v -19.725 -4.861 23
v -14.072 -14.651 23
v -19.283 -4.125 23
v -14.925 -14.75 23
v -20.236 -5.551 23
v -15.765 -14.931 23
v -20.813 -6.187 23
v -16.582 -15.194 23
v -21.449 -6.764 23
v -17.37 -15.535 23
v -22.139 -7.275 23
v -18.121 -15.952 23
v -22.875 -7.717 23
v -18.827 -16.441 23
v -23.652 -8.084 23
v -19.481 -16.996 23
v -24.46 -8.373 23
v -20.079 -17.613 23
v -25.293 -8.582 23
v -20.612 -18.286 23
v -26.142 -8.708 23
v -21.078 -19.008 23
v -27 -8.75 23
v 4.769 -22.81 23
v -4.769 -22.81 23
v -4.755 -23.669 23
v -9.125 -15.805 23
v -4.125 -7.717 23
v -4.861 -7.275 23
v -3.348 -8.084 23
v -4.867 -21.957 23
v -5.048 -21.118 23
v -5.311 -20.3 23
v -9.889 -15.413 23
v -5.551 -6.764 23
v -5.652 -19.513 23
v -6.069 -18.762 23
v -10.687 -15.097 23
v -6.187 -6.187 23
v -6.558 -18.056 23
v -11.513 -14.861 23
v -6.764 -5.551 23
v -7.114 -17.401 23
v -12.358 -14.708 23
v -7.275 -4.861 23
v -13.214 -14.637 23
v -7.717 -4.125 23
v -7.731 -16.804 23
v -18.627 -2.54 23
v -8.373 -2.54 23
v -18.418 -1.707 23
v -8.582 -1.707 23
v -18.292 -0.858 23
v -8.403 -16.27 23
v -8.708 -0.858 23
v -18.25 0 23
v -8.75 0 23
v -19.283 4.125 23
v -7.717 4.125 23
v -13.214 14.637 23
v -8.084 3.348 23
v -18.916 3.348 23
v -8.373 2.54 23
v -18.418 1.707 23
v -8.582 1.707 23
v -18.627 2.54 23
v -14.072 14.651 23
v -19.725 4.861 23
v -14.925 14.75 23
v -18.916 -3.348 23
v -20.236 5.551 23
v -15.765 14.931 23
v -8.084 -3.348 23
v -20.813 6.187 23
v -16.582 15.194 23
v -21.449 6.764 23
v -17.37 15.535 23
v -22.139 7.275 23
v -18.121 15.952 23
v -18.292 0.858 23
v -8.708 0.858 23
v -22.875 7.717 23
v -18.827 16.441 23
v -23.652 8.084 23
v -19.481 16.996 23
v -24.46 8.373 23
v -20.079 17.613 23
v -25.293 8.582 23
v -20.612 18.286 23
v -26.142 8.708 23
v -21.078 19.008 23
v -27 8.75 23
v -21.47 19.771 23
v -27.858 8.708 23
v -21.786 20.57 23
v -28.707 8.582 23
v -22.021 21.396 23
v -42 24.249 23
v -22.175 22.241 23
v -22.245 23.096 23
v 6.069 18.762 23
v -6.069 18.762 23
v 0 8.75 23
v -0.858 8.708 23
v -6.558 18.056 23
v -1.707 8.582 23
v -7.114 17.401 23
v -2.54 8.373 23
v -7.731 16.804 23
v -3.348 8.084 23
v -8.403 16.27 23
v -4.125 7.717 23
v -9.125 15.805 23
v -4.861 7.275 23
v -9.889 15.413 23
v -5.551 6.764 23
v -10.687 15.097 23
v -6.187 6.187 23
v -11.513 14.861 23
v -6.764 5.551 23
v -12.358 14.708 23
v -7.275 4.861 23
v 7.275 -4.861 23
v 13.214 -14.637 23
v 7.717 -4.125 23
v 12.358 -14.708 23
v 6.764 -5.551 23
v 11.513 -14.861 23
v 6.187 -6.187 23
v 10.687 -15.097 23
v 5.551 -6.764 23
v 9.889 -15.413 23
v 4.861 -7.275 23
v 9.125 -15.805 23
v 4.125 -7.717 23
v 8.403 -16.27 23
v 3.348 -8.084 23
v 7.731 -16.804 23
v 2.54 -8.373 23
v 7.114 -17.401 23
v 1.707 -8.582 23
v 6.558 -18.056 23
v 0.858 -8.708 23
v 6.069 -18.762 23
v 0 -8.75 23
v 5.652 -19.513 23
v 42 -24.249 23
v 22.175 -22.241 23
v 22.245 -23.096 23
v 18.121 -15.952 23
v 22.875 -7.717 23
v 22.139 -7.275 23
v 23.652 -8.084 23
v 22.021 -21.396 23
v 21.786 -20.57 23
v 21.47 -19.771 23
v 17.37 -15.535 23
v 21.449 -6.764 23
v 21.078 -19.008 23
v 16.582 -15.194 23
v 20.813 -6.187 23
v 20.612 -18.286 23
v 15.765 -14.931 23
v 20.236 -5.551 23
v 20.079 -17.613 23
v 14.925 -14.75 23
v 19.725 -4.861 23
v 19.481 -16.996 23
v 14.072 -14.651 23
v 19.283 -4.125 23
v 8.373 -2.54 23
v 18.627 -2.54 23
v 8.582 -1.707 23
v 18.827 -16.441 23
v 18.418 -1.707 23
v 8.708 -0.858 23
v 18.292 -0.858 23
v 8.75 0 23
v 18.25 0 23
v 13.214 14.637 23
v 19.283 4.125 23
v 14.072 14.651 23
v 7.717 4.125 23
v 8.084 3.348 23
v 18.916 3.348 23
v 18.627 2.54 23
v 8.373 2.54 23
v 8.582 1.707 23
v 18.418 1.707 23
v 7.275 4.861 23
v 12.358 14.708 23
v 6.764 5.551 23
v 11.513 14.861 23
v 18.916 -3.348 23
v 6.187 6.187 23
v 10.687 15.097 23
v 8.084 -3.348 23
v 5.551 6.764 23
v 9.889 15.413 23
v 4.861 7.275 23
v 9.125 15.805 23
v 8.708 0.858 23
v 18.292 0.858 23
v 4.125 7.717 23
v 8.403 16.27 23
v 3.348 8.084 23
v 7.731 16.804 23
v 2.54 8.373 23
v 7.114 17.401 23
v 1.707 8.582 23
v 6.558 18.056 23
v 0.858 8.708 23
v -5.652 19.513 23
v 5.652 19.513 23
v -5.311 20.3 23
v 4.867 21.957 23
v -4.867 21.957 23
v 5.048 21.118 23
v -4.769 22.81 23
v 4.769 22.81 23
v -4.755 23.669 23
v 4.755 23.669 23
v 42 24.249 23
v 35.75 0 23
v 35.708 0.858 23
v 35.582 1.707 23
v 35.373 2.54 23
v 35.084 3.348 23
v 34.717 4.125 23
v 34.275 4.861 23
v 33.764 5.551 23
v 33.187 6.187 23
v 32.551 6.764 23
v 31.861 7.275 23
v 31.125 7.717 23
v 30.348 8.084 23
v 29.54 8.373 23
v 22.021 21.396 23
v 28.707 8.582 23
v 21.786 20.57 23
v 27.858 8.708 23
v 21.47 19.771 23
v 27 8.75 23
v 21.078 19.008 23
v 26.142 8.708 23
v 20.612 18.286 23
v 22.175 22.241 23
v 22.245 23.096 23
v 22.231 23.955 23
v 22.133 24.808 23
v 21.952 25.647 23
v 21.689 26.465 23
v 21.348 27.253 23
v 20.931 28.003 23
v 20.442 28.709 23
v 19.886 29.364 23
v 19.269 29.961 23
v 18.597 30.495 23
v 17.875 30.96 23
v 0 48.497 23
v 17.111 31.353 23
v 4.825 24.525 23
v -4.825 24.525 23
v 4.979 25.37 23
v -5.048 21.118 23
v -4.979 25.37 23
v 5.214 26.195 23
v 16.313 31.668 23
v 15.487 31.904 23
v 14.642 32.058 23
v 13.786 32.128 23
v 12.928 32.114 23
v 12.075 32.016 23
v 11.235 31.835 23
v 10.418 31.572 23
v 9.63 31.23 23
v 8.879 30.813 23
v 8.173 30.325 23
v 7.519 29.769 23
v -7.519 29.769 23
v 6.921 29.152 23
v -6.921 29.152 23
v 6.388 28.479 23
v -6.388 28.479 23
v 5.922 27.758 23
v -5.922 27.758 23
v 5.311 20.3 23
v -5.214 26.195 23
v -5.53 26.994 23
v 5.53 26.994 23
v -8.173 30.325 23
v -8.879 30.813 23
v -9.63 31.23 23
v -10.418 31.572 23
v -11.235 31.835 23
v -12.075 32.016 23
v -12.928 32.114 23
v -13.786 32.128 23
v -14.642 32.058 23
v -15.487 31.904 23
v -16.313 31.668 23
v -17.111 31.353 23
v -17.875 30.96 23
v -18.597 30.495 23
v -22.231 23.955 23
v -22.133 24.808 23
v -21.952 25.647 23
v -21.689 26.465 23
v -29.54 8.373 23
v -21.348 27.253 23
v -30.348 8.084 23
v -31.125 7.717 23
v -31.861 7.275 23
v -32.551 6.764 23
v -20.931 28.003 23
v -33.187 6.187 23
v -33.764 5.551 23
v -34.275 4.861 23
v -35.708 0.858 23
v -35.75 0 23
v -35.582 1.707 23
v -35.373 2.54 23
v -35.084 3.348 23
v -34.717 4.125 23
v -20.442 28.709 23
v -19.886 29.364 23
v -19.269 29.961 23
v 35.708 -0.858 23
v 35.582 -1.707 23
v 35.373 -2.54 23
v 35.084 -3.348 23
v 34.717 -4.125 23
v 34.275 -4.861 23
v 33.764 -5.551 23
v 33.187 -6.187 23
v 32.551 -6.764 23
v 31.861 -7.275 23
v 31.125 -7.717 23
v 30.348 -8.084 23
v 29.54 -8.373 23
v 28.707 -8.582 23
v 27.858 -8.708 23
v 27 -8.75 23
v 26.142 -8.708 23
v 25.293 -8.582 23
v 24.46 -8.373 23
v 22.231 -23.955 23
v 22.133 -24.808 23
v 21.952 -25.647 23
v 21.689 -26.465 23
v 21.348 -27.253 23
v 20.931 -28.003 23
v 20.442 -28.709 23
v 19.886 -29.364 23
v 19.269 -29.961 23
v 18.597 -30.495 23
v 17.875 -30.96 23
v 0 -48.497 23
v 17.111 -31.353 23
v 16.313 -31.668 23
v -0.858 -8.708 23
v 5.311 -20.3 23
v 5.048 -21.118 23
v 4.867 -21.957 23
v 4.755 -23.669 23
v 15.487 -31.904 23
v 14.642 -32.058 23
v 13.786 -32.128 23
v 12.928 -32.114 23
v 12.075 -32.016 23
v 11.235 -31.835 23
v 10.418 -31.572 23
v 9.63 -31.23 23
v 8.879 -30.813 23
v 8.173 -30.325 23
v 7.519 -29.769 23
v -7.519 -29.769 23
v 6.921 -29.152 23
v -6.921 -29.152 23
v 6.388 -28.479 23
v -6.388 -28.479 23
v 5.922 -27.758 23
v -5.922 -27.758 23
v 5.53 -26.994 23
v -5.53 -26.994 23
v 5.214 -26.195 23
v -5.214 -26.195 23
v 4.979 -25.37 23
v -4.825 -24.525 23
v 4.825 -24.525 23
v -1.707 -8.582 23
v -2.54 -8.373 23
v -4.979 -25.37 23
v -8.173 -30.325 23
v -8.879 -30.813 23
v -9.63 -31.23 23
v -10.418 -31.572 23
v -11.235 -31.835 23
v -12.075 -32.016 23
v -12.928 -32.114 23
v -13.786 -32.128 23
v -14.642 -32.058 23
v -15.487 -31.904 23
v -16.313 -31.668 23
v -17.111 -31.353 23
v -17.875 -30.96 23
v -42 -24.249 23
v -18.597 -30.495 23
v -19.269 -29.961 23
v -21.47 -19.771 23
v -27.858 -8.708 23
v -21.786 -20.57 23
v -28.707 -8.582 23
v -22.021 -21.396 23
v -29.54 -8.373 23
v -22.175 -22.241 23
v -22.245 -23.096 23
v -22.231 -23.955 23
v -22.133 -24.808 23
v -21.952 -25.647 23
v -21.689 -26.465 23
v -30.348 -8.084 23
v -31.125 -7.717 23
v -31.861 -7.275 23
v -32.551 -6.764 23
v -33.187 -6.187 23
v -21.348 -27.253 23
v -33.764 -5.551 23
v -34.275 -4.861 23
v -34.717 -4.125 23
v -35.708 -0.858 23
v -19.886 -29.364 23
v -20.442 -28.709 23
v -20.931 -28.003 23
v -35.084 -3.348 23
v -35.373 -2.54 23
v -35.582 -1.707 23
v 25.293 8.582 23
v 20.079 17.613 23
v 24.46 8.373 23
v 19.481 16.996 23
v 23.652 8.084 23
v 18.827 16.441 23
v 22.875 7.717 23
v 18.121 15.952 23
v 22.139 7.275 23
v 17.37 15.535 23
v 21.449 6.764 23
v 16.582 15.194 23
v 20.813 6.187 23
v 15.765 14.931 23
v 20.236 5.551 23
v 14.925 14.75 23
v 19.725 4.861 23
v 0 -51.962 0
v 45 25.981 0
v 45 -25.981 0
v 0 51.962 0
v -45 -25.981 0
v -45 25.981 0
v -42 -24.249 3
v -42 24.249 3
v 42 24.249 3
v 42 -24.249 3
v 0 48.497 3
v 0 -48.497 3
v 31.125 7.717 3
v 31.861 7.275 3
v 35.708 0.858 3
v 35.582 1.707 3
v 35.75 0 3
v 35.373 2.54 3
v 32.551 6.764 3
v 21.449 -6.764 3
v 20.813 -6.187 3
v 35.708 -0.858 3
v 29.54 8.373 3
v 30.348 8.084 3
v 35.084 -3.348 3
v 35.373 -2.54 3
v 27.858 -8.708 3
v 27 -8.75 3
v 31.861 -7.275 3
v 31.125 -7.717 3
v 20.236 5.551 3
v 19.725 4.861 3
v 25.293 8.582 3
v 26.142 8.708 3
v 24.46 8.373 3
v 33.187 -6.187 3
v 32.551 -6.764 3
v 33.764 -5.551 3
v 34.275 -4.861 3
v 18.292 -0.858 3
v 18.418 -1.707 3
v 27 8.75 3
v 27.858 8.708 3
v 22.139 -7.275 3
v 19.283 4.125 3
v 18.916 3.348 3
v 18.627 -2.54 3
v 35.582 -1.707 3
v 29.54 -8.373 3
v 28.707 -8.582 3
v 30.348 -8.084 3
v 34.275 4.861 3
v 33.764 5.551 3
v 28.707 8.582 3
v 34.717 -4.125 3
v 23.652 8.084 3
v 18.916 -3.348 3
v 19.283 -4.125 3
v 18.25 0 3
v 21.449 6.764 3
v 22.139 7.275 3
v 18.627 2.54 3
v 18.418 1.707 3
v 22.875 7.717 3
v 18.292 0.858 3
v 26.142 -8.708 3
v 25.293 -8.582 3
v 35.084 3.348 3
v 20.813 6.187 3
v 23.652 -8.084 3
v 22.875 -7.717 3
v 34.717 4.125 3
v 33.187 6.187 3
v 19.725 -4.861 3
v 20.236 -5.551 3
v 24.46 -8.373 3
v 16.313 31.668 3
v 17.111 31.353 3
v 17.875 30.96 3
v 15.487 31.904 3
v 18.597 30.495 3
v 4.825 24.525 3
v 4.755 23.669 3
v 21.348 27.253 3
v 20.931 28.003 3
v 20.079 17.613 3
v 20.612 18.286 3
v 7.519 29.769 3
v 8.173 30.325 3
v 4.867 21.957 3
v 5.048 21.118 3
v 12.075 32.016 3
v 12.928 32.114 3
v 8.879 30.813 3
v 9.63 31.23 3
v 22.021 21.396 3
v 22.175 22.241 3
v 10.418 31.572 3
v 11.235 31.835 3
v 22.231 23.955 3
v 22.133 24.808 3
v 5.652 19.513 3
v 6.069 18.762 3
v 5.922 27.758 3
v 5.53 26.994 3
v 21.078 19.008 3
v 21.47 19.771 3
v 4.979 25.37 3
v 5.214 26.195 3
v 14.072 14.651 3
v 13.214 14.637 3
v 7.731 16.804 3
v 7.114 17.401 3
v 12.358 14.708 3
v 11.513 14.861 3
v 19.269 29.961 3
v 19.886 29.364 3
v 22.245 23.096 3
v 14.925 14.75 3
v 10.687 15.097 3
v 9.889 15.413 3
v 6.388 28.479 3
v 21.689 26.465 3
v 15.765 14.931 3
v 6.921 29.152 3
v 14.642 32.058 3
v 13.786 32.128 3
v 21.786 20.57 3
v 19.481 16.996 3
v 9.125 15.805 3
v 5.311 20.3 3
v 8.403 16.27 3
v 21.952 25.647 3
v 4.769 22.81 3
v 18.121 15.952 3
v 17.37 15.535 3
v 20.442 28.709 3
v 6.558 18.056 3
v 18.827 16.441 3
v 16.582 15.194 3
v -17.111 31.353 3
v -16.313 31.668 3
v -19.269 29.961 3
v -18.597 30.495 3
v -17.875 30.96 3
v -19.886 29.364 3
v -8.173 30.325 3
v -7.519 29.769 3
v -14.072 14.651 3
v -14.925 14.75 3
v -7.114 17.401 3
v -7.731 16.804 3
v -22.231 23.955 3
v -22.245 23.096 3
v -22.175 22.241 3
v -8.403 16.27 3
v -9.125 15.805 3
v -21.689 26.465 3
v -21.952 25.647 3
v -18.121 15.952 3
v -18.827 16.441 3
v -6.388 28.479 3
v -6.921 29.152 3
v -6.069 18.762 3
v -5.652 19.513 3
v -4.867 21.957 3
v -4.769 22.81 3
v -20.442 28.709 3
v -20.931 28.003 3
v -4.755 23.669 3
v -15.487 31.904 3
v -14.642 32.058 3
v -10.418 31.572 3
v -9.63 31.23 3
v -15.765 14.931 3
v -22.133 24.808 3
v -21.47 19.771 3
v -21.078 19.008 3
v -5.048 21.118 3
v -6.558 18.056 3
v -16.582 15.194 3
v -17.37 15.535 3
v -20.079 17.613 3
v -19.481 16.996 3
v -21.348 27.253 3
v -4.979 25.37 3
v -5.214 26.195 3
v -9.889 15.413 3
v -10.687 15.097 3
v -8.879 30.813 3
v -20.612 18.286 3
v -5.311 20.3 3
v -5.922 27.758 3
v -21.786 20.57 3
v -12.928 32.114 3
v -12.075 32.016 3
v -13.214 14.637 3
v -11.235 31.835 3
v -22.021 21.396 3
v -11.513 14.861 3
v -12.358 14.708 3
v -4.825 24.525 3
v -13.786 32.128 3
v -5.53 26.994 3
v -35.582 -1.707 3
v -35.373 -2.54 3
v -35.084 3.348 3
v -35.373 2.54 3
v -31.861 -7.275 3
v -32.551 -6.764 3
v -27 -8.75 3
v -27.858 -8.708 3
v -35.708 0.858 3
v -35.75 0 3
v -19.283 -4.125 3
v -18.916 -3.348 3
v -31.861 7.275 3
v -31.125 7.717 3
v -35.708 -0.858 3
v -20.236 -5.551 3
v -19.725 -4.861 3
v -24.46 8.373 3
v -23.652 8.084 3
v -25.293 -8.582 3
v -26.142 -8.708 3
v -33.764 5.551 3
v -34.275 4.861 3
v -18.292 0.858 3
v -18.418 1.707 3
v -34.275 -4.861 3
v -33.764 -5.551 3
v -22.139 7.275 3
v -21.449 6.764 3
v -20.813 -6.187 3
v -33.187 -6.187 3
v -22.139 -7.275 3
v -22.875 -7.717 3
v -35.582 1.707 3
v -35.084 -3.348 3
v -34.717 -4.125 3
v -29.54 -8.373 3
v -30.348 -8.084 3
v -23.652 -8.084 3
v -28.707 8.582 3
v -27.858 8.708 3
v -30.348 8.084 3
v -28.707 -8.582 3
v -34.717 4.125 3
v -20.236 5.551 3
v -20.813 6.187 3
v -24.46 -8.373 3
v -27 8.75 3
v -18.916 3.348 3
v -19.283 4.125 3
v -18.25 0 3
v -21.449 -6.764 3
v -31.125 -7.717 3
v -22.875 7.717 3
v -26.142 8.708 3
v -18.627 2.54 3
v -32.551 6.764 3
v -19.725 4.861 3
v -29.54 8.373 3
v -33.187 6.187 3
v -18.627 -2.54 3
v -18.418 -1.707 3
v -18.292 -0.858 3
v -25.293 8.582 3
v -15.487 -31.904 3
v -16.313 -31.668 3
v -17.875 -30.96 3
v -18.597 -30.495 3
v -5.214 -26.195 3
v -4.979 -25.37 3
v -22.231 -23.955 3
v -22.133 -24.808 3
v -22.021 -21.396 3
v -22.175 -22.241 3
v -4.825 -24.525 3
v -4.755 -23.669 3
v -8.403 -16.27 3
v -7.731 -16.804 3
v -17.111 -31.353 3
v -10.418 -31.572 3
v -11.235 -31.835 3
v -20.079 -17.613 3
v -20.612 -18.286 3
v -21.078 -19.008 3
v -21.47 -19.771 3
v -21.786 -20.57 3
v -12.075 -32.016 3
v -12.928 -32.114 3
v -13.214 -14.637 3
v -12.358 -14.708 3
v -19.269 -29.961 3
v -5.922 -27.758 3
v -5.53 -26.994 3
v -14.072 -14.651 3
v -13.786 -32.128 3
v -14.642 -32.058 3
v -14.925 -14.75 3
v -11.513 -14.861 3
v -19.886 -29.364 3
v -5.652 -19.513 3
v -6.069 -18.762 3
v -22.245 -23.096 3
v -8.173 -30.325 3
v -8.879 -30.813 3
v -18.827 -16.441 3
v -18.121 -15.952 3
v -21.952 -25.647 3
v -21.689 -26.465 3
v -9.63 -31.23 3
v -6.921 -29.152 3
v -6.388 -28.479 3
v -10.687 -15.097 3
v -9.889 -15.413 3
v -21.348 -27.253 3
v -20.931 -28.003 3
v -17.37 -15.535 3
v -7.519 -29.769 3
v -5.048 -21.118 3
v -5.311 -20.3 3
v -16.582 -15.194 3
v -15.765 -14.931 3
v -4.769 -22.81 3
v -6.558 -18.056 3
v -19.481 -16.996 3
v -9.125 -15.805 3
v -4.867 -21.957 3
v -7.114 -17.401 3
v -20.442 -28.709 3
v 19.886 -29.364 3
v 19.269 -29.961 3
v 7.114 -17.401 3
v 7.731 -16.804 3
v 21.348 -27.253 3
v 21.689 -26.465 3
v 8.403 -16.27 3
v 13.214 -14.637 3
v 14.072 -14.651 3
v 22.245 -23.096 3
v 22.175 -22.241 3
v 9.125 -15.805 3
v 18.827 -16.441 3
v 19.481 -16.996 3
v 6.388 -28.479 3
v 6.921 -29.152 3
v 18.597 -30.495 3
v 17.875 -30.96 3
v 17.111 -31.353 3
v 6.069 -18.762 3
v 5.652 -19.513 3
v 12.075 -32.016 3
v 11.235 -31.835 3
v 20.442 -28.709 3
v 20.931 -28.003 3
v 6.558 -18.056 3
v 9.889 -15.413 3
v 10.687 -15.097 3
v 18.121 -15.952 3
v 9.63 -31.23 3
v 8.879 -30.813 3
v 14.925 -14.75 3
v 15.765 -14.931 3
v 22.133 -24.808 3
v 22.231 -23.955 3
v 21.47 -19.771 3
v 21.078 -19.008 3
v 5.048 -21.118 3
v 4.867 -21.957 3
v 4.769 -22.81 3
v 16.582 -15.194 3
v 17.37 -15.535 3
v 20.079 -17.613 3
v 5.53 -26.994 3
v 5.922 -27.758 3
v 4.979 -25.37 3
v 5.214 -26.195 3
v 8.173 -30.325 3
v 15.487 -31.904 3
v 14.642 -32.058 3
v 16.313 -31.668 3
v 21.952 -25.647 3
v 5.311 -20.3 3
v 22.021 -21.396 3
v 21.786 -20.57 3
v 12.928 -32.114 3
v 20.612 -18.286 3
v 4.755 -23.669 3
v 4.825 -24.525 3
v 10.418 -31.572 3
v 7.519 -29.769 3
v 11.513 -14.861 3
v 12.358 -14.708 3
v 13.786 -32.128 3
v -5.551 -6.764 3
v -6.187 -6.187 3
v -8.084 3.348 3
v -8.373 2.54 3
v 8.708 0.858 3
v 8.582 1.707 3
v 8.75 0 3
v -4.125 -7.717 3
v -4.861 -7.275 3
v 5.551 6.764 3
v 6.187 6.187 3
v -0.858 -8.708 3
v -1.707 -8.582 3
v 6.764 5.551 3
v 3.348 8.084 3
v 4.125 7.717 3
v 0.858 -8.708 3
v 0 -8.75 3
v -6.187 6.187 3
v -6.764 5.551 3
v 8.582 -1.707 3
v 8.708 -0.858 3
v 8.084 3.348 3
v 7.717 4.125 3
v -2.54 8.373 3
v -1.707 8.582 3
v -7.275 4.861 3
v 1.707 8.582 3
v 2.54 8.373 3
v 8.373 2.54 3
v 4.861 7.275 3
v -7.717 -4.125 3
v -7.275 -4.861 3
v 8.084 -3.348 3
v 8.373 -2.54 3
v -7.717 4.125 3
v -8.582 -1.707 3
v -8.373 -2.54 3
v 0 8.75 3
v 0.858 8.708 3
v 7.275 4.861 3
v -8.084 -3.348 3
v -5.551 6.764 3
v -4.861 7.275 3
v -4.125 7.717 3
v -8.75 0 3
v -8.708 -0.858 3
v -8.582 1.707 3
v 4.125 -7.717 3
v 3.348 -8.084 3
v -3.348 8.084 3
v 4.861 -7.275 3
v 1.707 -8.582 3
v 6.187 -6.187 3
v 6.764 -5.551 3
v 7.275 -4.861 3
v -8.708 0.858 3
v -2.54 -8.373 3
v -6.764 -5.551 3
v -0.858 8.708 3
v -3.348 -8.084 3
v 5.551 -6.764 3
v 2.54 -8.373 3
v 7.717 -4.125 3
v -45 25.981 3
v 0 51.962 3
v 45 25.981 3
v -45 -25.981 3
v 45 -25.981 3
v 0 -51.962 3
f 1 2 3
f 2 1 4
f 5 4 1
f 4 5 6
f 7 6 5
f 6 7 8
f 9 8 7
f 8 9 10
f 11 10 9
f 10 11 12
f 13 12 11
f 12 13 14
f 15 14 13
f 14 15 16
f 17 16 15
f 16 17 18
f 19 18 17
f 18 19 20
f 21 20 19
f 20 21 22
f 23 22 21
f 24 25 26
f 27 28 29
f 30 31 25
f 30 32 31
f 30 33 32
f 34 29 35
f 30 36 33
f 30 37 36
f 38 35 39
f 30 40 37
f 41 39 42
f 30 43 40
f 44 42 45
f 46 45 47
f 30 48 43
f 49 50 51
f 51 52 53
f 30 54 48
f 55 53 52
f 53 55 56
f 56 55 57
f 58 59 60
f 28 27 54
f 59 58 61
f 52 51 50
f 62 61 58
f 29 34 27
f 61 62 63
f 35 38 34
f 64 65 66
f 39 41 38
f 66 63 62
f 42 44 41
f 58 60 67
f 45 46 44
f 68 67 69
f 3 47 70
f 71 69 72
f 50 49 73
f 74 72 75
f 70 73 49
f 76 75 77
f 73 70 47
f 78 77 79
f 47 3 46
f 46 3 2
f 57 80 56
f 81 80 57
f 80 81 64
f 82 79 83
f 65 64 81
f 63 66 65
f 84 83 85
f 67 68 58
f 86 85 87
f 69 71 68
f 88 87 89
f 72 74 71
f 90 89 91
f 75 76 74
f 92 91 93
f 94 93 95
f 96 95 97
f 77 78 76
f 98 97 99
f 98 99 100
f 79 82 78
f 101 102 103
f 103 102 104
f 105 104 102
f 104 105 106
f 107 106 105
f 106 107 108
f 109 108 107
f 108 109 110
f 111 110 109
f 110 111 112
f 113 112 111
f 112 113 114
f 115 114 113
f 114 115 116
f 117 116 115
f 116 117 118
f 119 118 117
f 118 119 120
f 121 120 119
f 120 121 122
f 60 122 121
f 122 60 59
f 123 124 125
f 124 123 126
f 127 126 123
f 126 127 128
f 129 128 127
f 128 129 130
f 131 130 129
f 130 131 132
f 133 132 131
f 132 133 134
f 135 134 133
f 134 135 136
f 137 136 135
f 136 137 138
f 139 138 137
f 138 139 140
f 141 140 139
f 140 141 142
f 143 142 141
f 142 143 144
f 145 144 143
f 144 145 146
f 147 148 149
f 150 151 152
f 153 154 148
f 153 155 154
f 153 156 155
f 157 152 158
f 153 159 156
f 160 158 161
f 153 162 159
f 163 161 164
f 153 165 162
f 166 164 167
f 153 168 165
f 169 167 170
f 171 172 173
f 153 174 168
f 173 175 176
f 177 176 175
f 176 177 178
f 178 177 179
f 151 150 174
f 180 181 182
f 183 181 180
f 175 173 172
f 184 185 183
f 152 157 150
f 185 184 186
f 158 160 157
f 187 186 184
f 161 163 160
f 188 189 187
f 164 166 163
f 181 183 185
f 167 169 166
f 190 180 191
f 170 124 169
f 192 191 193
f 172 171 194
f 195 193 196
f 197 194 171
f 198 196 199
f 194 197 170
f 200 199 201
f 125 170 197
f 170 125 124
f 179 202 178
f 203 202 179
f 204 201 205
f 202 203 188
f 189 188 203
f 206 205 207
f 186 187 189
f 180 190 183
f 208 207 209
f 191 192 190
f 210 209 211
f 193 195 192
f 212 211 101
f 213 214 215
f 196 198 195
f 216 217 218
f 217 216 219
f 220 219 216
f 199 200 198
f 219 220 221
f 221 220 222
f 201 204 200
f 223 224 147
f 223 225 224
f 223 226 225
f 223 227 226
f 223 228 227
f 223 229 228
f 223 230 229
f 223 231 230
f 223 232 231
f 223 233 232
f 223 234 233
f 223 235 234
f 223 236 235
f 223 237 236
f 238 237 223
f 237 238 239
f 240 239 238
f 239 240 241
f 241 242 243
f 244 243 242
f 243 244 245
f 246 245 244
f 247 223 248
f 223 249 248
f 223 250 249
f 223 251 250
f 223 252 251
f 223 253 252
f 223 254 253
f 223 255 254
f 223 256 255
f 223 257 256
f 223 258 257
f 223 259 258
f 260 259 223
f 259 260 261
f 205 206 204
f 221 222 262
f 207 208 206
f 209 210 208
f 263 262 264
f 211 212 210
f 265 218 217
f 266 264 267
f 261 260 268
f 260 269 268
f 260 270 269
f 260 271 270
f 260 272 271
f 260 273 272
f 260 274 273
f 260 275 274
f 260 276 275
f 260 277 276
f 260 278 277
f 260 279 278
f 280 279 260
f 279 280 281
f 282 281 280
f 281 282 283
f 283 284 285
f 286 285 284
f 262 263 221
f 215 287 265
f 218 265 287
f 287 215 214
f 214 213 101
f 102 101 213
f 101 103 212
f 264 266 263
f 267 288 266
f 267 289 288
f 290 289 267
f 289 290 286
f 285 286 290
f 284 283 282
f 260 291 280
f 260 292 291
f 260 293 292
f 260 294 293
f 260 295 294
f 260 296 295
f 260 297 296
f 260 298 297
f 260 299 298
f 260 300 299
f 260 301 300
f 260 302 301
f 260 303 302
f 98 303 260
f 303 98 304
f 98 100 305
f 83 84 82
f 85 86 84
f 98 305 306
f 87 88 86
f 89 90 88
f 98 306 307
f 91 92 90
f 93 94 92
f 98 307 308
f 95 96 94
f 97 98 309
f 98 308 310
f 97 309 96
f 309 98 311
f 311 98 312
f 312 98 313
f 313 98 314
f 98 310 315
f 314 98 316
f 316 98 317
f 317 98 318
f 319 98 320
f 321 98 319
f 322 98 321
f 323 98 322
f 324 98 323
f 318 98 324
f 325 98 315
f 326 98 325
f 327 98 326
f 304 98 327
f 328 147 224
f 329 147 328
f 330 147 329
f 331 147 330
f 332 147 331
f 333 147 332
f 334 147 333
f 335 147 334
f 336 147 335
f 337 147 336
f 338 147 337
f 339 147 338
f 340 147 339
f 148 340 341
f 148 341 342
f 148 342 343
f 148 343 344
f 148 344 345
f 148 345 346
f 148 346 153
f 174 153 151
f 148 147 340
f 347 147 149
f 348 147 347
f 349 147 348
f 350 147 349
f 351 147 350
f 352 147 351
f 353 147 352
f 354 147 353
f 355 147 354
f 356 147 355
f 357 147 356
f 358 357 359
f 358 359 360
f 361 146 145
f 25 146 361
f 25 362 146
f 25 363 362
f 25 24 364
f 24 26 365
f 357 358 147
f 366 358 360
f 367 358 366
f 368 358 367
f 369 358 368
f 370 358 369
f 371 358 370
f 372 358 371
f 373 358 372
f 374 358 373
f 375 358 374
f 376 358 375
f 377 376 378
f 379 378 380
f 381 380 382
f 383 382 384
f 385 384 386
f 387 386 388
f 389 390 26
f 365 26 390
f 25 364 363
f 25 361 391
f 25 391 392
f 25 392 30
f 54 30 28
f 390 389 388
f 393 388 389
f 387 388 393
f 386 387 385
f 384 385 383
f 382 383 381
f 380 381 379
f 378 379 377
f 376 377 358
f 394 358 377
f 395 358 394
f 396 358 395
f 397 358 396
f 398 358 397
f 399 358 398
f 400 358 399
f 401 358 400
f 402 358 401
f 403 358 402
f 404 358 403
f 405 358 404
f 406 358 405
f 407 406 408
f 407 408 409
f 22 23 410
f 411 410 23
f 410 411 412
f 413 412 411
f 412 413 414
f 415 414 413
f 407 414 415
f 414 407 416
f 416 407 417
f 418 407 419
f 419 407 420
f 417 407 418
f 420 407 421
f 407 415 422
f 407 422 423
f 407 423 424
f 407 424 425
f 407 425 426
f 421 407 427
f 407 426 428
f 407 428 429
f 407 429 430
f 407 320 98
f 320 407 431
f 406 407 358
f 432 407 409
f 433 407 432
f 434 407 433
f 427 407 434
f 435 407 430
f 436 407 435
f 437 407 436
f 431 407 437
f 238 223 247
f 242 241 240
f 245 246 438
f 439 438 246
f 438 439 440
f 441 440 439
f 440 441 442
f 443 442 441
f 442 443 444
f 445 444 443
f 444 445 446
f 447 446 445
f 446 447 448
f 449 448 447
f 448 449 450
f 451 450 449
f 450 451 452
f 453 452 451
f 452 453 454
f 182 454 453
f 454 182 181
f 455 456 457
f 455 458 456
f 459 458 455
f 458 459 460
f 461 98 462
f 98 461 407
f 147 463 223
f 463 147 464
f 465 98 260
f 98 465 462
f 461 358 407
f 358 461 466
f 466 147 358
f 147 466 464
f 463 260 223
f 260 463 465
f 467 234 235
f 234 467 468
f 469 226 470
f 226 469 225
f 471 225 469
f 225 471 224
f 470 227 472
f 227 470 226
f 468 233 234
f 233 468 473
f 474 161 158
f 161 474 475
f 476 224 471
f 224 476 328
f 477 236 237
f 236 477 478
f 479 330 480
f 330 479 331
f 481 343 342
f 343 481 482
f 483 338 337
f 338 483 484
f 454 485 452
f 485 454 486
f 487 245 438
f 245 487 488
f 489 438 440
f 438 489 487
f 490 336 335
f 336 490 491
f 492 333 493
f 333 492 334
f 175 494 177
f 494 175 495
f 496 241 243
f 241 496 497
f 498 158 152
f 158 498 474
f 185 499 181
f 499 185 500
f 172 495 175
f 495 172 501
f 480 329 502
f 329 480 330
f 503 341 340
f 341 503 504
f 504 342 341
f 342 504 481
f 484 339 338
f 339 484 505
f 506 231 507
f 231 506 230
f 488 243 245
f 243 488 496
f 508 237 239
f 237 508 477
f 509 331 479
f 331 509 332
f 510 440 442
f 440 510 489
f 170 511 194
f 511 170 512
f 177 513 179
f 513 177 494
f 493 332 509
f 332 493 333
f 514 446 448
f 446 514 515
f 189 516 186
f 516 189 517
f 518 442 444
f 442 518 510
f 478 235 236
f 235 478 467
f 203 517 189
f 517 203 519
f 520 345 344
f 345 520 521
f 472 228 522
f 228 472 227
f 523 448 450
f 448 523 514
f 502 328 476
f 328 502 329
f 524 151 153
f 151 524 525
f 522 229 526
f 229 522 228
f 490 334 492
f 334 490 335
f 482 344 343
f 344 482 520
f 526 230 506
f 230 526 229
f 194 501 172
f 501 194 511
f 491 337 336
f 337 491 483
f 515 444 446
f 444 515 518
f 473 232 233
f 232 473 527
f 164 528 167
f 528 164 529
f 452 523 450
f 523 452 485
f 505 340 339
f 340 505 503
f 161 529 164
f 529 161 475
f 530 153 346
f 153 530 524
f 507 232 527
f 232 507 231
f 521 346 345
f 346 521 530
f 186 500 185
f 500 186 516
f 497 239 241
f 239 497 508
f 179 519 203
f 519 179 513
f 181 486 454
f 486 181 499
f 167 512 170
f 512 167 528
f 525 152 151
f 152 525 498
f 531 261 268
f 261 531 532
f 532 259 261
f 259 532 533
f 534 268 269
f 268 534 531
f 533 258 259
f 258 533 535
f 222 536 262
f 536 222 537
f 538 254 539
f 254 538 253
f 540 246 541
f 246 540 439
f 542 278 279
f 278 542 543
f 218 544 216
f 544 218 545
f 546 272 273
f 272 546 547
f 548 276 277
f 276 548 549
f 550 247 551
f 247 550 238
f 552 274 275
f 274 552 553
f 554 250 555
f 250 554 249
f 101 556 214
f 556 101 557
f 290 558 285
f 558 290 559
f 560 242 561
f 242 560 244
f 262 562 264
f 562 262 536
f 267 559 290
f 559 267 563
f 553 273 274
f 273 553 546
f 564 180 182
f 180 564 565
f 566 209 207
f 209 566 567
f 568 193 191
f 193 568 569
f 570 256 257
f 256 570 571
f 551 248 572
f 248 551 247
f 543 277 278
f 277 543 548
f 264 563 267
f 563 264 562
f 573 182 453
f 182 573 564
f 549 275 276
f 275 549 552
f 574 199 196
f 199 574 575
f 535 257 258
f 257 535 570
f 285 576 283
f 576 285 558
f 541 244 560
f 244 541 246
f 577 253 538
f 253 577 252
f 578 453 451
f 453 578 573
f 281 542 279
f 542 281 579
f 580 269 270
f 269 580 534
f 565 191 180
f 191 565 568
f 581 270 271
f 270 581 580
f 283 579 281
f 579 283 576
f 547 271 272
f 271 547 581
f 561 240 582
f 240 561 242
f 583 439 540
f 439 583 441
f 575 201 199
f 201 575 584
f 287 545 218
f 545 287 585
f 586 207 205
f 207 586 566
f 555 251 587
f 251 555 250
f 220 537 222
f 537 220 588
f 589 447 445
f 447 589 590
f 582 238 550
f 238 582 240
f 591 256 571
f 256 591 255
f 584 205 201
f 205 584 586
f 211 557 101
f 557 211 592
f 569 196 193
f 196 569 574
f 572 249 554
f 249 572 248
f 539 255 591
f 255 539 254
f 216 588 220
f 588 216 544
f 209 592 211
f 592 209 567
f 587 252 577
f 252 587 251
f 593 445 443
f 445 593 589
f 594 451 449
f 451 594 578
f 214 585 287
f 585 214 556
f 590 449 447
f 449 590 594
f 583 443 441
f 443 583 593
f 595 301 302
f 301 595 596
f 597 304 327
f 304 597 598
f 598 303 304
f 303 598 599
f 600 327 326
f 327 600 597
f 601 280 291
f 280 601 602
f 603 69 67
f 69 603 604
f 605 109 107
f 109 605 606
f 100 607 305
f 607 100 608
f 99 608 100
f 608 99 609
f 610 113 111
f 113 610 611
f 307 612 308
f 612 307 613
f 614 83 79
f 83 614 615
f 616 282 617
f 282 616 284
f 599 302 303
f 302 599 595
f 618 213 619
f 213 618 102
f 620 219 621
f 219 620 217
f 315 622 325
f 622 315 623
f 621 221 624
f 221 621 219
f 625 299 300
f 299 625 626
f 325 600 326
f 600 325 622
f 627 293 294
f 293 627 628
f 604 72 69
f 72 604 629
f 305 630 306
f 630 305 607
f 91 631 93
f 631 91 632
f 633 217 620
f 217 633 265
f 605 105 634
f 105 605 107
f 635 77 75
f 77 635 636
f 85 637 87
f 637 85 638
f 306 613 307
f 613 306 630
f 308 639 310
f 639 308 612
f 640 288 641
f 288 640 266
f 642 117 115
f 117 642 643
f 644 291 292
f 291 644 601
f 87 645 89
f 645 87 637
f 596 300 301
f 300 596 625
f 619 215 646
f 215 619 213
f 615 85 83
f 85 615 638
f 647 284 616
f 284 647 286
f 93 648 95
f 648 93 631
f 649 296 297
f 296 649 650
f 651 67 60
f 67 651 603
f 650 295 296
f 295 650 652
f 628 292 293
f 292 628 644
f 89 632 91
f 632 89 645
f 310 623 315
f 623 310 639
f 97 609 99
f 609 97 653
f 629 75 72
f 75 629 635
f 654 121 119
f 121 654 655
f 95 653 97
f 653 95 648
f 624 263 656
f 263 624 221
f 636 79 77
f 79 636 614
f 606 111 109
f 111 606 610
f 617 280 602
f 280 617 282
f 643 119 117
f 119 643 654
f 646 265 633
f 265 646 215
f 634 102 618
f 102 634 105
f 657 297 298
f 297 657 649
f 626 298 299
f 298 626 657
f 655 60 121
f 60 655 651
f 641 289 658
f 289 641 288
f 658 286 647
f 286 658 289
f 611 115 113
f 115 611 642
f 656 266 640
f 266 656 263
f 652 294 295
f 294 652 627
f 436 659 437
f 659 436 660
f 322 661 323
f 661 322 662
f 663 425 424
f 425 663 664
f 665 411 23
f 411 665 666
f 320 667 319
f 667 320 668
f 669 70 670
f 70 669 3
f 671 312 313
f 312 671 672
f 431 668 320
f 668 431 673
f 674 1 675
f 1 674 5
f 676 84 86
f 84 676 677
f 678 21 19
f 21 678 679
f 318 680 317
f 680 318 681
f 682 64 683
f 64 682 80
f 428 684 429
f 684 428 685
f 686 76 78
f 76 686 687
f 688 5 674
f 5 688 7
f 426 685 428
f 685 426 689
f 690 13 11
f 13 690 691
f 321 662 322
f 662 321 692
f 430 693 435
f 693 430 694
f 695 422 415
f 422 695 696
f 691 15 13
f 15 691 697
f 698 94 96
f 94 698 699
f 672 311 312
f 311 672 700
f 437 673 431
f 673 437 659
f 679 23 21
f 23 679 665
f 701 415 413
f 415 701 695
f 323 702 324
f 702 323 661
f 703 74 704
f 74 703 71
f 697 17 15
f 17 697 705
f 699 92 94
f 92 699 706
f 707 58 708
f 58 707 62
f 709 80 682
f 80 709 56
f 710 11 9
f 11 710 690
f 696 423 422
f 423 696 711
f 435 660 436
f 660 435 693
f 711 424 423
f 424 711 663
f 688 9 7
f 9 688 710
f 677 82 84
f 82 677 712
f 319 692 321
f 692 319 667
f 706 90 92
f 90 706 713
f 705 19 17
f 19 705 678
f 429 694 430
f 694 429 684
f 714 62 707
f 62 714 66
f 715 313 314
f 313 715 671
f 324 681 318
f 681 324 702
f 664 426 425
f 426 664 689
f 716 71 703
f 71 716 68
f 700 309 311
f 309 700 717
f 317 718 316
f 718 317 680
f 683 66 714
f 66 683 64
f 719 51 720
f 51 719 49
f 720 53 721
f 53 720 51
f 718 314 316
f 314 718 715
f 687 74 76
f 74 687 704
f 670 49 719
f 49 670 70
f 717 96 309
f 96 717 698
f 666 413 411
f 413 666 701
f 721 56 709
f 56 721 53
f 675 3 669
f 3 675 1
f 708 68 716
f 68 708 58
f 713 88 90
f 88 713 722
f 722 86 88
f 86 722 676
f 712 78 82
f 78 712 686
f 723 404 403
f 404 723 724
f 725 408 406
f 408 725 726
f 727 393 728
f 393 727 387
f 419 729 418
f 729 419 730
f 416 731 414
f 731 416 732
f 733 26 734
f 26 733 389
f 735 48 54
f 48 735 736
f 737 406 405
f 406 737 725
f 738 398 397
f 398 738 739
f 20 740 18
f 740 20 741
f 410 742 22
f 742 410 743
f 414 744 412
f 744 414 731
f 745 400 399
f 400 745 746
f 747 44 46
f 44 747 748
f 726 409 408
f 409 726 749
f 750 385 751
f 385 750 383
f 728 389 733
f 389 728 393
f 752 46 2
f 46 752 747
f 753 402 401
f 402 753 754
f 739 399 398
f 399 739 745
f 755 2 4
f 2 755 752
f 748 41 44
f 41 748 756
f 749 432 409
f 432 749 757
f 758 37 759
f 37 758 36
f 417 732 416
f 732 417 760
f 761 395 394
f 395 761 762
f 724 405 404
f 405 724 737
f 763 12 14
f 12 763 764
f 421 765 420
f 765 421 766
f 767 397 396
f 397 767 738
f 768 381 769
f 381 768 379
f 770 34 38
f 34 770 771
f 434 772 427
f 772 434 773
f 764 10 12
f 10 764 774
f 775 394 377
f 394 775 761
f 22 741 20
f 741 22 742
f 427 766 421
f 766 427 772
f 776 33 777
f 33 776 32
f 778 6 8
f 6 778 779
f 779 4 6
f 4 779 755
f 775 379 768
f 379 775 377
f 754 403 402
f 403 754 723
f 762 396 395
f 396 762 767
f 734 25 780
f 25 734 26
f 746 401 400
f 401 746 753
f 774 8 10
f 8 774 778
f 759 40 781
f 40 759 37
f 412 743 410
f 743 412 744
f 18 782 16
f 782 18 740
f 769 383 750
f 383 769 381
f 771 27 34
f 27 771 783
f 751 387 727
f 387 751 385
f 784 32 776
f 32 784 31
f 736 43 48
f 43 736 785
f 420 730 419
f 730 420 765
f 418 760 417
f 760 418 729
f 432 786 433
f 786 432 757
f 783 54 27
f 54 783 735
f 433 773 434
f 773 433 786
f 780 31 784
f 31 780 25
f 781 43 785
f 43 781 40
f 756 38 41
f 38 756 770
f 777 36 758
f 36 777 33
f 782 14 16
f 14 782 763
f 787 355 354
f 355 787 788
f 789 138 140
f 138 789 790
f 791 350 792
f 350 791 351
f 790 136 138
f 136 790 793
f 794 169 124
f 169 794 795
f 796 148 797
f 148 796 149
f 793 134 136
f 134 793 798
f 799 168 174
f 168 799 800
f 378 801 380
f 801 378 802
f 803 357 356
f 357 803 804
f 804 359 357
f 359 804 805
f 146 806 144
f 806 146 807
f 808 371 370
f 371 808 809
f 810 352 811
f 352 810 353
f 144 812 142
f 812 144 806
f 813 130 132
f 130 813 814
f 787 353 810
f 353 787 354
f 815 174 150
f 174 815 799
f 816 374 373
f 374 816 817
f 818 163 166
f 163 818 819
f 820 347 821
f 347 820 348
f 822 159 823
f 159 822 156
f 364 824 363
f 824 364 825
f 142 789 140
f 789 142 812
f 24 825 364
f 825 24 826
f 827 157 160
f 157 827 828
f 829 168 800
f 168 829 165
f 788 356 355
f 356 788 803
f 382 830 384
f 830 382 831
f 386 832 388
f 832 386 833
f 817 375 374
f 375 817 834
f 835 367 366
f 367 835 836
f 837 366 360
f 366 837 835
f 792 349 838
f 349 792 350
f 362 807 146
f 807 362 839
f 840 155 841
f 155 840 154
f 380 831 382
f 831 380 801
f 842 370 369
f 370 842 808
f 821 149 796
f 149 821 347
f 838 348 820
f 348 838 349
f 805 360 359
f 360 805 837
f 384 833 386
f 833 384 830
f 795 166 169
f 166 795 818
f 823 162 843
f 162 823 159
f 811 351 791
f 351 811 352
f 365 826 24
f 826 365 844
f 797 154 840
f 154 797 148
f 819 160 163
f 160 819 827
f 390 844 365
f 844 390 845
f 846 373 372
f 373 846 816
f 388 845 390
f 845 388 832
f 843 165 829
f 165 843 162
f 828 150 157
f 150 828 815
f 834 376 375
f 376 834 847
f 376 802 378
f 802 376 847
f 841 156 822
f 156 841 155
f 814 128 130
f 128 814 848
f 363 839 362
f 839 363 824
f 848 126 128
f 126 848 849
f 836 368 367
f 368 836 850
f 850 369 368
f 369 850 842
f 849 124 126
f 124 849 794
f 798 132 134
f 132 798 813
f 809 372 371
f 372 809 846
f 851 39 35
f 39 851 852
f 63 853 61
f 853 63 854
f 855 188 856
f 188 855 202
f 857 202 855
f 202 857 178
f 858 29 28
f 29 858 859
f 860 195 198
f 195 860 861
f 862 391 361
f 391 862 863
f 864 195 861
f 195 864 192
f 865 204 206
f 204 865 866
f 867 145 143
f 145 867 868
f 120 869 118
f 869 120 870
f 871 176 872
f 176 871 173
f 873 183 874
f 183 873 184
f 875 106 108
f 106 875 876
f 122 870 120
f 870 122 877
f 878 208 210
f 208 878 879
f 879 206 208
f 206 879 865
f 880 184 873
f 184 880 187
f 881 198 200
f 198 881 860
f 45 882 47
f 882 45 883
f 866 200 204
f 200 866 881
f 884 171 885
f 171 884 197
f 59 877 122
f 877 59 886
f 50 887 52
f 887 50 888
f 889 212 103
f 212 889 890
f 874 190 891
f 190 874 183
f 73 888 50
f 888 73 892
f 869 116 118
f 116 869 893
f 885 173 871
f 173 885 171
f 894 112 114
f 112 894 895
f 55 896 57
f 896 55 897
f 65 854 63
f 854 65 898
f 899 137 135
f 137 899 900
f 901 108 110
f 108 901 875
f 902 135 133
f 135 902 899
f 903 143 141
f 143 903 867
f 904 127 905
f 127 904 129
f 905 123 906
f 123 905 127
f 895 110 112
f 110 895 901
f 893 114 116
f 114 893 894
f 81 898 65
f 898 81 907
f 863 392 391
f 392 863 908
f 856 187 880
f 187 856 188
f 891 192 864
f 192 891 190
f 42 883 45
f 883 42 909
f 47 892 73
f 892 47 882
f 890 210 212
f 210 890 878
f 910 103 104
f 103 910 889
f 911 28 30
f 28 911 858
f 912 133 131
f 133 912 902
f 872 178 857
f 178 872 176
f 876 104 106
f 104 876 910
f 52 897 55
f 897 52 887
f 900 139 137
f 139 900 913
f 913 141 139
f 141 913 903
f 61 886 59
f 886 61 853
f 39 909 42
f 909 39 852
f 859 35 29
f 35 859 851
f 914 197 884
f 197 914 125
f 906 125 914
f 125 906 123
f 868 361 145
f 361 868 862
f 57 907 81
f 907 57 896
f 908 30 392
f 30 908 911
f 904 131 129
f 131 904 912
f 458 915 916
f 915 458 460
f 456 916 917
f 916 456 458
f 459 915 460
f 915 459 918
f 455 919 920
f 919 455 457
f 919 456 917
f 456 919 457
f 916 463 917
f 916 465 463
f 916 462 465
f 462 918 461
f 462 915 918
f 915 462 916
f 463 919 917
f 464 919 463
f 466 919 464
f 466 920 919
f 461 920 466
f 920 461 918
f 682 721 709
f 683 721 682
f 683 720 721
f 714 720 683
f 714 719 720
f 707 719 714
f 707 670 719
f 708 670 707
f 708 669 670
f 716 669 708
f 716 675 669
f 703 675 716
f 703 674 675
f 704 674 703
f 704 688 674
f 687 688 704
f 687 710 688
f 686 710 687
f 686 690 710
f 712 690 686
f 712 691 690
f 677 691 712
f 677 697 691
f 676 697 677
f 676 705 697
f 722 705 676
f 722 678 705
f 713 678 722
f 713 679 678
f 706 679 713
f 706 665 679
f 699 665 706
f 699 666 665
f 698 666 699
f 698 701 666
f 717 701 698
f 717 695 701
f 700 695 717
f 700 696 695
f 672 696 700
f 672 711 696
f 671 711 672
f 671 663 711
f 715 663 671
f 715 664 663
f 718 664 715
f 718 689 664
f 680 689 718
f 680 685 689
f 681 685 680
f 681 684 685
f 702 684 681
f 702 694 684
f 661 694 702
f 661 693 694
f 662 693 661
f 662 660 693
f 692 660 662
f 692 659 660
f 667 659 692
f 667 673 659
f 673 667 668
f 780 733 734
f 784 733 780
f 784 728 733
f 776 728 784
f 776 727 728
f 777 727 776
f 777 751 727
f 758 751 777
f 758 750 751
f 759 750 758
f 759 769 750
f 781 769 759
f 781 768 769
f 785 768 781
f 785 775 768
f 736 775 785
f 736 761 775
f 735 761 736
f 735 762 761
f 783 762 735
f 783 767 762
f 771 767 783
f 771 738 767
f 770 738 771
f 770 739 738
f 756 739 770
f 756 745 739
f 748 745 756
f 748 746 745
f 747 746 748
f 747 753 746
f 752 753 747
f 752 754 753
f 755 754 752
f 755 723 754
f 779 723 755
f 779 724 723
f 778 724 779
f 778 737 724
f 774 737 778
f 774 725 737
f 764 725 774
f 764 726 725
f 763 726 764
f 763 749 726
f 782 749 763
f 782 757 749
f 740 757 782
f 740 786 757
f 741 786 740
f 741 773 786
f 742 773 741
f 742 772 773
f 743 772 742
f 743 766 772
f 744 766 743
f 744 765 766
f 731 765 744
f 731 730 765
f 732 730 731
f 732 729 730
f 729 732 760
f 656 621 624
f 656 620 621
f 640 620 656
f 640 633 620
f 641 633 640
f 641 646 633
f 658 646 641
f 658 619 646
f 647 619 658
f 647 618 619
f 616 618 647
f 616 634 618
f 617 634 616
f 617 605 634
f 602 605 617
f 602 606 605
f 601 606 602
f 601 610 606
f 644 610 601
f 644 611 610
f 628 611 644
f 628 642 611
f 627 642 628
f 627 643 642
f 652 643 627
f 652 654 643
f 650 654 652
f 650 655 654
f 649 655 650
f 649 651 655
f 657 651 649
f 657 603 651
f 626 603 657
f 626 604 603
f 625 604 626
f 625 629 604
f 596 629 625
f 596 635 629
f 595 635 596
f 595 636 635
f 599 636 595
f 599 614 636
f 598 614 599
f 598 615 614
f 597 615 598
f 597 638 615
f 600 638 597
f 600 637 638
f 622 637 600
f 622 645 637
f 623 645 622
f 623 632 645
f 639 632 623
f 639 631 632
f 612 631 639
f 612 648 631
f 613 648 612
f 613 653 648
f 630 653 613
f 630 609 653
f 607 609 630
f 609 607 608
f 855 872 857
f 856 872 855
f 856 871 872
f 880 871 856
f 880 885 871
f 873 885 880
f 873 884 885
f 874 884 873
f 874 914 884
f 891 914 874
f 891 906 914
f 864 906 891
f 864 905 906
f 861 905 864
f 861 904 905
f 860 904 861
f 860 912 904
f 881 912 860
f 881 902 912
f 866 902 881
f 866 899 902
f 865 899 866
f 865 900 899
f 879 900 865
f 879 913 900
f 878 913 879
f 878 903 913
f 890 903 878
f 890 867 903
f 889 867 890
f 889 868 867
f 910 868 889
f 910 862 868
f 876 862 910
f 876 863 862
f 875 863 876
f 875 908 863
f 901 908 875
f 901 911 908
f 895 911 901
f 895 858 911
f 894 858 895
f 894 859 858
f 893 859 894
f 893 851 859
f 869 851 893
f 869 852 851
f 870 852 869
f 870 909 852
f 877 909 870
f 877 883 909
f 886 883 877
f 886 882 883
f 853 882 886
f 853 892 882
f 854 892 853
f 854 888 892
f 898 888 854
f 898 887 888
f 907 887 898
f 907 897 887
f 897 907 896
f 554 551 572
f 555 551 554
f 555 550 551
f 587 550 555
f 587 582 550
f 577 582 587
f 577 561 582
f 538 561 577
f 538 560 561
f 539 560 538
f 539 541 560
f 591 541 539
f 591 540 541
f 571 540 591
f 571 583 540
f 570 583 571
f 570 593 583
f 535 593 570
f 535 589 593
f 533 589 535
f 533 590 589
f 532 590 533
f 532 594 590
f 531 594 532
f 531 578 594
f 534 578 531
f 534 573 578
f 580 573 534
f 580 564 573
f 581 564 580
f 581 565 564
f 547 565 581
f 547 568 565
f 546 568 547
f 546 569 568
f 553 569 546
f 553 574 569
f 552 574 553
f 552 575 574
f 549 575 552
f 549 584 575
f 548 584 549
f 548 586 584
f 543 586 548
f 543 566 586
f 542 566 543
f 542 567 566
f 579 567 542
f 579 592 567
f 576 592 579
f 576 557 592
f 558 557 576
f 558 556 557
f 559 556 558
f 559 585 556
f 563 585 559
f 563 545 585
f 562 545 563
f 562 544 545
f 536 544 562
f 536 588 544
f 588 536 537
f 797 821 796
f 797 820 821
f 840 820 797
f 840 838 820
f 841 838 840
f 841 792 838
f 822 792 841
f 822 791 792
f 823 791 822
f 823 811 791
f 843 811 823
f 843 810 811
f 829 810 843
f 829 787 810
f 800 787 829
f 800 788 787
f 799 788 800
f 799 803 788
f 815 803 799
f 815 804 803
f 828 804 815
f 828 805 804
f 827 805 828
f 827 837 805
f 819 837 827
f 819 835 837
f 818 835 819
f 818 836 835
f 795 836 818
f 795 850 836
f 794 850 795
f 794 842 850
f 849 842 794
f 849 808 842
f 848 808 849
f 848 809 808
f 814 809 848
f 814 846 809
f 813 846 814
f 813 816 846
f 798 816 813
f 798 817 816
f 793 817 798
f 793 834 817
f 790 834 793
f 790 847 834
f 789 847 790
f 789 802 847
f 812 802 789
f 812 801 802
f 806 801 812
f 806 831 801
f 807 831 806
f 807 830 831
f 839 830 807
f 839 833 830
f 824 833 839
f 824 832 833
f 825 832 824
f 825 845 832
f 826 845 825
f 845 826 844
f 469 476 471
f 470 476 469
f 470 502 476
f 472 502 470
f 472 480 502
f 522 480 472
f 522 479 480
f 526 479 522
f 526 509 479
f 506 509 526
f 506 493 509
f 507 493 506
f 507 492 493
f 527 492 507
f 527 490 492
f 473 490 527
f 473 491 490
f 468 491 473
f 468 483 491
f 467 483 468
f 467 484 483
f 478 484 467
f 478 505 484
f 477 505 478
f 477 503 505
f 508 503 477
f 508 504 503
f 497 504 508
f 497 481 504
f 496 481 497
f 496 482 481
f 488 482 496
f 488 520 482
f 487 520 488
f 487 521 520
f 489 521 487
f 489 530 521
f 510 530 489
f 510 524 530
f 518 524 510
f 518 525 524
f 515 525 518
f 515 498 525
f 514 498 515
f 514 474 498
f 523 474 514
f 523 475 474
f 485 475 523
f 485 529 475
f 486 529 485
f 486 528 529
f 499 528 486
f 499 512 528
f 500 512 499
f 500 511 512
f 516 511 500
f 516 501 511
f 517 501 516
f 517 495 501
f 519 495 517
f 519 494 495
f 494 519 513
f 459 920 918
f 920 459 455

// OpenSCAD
// Float for seven 15 mL conical tubes
// Designed to be printed upside down (flat plate at z=0)

// --- Dimensions ---
plate_across_flats = 90.0; // Distance between parallel sides of the hexagonal plate
plate_thickness    = 3.0;  // Thickness of the base plate
tube_hole_d        = 17.5; // Diameter of the conical tube holes
tube_sleeve_od     = 21.5; // Outside diameter of the sleeves
tube_sleeve_wall   = 2.0;  // Wall thickness of the sleeves
tube_sleeve_h      = 20.0; // Height of the sleeves and skirt

circle_dia         = 54.0; // Diameter of the circle of holes
skirt_across_flats  = 84.0; // Distance between parallel sides of the hexagonal skirt
skirt_wall         = 2.0;  // Wall thickness of the skirt

$fn = 64;

// --- Helper Modules ---

// Generates a regular hexagon based on "across flats" dimension
module hexagon_flat(d_flats, height) {
    // The distance from center to vertex (circumradius) is d_flats / sqrt(3)
    // But we can use the polygon function with the apothem (d_flats / 2)
    // For a regular hexagon, the vertices are at distance R = apothem / cos(30)
    r_vertex = (d_flats / 2) / cos(30);
    
    linear_extrude(height = height)
    polygon(points = [
        [r_vertex * cos(0),   r_vertex * sin(0)],
        [r_vertex * cos(60),  r_vertex * sin(60)],
        [r_vertex * cos(120), r_vertex * sin(120)],
        [r_vertex * cos(180), r_vertex * sin(180)],
        [r_vertex * cos(240), r_vertex * sin(240)],
        [r_vertex * cos(300), r_vertex * sin(300)]
    ]);
}

// --- Main Construction ---

// The user requested the part be printed "upside down" (plate at z=0)
// This means the features (sleeves/skirt) build UP from the plate.
// Note: To float, the air is trapped "under" the plate when flipped.
// In OpenSCAD, we build the plate at z=0 and extrude upwards.

union() {
    // 1. The Base Plate
    // We use a hexagon with two flats parallel to X axis.
    // In a standard polygon, the first vertex is at 0 deg (on X axis).
    // To have flats parallel to X, we rotate the hexagon by 30 degrees.
    rotate([0, 0, 30])
    hexagon_flat(plate_across_flats, plate_thickness);

    // 2. The Sleeves and Skirt
    // We build these as a single union, then subtract the holes.
    difference() {
        union() {
            // The Hexagonal Skirt
            rotate([0, 0, 30])
            hexagon_flat(skirt_across_flats, tube_sleeve_h + plate_thickness);

            // The Seven Sleeves
            // Center sleeve
            cylinder(h = tube_sleeve_h + plate_thickness, d = tube_sleeve_od);

            // Six peripheral sleeves
            for (i = [0 : 5]) {
                angle = i * 60;
                // The first hole is on the +X axis (0 degrees)
                rotate([0, 0, angle])
                translate([circle_dia / 2, 0, 0])
                cylinder(h = tube_sleeve_h + plate_thickness, d = tube_sleeve_od);
            }
        }

        // 3. The Holes (Subtracted from the union above)
        // We subtract from the plate and the extrusions.
        // We extend the subtraction slightly to ensure clean cuts.
        
        // Center hole
        translate([0, 0, -0.01])
        cylinder(h = plate_thickness + tube_sleeve_h + 0.02, d = tube_hole_d);

        // Peripheral holes
        for (i = [0 : 5]) {
            angle = i * 60;
            rotate([0, 0, angle])
            translate([circle_dia / 2, 0, -0.01])
            cylinder(h = plate_thickness + tube_sleeve_h + 0.02, d = tube_hole_d);
        }
    }
}

// Note on orientation: 
// The plate is at Z=0. The sleeves/skirt go from Z=3 to Z=23.
// When printed, the flat plate is on the bed.
// When flipped for use, the holes face down, trapping air in the sleeves/skirt.
